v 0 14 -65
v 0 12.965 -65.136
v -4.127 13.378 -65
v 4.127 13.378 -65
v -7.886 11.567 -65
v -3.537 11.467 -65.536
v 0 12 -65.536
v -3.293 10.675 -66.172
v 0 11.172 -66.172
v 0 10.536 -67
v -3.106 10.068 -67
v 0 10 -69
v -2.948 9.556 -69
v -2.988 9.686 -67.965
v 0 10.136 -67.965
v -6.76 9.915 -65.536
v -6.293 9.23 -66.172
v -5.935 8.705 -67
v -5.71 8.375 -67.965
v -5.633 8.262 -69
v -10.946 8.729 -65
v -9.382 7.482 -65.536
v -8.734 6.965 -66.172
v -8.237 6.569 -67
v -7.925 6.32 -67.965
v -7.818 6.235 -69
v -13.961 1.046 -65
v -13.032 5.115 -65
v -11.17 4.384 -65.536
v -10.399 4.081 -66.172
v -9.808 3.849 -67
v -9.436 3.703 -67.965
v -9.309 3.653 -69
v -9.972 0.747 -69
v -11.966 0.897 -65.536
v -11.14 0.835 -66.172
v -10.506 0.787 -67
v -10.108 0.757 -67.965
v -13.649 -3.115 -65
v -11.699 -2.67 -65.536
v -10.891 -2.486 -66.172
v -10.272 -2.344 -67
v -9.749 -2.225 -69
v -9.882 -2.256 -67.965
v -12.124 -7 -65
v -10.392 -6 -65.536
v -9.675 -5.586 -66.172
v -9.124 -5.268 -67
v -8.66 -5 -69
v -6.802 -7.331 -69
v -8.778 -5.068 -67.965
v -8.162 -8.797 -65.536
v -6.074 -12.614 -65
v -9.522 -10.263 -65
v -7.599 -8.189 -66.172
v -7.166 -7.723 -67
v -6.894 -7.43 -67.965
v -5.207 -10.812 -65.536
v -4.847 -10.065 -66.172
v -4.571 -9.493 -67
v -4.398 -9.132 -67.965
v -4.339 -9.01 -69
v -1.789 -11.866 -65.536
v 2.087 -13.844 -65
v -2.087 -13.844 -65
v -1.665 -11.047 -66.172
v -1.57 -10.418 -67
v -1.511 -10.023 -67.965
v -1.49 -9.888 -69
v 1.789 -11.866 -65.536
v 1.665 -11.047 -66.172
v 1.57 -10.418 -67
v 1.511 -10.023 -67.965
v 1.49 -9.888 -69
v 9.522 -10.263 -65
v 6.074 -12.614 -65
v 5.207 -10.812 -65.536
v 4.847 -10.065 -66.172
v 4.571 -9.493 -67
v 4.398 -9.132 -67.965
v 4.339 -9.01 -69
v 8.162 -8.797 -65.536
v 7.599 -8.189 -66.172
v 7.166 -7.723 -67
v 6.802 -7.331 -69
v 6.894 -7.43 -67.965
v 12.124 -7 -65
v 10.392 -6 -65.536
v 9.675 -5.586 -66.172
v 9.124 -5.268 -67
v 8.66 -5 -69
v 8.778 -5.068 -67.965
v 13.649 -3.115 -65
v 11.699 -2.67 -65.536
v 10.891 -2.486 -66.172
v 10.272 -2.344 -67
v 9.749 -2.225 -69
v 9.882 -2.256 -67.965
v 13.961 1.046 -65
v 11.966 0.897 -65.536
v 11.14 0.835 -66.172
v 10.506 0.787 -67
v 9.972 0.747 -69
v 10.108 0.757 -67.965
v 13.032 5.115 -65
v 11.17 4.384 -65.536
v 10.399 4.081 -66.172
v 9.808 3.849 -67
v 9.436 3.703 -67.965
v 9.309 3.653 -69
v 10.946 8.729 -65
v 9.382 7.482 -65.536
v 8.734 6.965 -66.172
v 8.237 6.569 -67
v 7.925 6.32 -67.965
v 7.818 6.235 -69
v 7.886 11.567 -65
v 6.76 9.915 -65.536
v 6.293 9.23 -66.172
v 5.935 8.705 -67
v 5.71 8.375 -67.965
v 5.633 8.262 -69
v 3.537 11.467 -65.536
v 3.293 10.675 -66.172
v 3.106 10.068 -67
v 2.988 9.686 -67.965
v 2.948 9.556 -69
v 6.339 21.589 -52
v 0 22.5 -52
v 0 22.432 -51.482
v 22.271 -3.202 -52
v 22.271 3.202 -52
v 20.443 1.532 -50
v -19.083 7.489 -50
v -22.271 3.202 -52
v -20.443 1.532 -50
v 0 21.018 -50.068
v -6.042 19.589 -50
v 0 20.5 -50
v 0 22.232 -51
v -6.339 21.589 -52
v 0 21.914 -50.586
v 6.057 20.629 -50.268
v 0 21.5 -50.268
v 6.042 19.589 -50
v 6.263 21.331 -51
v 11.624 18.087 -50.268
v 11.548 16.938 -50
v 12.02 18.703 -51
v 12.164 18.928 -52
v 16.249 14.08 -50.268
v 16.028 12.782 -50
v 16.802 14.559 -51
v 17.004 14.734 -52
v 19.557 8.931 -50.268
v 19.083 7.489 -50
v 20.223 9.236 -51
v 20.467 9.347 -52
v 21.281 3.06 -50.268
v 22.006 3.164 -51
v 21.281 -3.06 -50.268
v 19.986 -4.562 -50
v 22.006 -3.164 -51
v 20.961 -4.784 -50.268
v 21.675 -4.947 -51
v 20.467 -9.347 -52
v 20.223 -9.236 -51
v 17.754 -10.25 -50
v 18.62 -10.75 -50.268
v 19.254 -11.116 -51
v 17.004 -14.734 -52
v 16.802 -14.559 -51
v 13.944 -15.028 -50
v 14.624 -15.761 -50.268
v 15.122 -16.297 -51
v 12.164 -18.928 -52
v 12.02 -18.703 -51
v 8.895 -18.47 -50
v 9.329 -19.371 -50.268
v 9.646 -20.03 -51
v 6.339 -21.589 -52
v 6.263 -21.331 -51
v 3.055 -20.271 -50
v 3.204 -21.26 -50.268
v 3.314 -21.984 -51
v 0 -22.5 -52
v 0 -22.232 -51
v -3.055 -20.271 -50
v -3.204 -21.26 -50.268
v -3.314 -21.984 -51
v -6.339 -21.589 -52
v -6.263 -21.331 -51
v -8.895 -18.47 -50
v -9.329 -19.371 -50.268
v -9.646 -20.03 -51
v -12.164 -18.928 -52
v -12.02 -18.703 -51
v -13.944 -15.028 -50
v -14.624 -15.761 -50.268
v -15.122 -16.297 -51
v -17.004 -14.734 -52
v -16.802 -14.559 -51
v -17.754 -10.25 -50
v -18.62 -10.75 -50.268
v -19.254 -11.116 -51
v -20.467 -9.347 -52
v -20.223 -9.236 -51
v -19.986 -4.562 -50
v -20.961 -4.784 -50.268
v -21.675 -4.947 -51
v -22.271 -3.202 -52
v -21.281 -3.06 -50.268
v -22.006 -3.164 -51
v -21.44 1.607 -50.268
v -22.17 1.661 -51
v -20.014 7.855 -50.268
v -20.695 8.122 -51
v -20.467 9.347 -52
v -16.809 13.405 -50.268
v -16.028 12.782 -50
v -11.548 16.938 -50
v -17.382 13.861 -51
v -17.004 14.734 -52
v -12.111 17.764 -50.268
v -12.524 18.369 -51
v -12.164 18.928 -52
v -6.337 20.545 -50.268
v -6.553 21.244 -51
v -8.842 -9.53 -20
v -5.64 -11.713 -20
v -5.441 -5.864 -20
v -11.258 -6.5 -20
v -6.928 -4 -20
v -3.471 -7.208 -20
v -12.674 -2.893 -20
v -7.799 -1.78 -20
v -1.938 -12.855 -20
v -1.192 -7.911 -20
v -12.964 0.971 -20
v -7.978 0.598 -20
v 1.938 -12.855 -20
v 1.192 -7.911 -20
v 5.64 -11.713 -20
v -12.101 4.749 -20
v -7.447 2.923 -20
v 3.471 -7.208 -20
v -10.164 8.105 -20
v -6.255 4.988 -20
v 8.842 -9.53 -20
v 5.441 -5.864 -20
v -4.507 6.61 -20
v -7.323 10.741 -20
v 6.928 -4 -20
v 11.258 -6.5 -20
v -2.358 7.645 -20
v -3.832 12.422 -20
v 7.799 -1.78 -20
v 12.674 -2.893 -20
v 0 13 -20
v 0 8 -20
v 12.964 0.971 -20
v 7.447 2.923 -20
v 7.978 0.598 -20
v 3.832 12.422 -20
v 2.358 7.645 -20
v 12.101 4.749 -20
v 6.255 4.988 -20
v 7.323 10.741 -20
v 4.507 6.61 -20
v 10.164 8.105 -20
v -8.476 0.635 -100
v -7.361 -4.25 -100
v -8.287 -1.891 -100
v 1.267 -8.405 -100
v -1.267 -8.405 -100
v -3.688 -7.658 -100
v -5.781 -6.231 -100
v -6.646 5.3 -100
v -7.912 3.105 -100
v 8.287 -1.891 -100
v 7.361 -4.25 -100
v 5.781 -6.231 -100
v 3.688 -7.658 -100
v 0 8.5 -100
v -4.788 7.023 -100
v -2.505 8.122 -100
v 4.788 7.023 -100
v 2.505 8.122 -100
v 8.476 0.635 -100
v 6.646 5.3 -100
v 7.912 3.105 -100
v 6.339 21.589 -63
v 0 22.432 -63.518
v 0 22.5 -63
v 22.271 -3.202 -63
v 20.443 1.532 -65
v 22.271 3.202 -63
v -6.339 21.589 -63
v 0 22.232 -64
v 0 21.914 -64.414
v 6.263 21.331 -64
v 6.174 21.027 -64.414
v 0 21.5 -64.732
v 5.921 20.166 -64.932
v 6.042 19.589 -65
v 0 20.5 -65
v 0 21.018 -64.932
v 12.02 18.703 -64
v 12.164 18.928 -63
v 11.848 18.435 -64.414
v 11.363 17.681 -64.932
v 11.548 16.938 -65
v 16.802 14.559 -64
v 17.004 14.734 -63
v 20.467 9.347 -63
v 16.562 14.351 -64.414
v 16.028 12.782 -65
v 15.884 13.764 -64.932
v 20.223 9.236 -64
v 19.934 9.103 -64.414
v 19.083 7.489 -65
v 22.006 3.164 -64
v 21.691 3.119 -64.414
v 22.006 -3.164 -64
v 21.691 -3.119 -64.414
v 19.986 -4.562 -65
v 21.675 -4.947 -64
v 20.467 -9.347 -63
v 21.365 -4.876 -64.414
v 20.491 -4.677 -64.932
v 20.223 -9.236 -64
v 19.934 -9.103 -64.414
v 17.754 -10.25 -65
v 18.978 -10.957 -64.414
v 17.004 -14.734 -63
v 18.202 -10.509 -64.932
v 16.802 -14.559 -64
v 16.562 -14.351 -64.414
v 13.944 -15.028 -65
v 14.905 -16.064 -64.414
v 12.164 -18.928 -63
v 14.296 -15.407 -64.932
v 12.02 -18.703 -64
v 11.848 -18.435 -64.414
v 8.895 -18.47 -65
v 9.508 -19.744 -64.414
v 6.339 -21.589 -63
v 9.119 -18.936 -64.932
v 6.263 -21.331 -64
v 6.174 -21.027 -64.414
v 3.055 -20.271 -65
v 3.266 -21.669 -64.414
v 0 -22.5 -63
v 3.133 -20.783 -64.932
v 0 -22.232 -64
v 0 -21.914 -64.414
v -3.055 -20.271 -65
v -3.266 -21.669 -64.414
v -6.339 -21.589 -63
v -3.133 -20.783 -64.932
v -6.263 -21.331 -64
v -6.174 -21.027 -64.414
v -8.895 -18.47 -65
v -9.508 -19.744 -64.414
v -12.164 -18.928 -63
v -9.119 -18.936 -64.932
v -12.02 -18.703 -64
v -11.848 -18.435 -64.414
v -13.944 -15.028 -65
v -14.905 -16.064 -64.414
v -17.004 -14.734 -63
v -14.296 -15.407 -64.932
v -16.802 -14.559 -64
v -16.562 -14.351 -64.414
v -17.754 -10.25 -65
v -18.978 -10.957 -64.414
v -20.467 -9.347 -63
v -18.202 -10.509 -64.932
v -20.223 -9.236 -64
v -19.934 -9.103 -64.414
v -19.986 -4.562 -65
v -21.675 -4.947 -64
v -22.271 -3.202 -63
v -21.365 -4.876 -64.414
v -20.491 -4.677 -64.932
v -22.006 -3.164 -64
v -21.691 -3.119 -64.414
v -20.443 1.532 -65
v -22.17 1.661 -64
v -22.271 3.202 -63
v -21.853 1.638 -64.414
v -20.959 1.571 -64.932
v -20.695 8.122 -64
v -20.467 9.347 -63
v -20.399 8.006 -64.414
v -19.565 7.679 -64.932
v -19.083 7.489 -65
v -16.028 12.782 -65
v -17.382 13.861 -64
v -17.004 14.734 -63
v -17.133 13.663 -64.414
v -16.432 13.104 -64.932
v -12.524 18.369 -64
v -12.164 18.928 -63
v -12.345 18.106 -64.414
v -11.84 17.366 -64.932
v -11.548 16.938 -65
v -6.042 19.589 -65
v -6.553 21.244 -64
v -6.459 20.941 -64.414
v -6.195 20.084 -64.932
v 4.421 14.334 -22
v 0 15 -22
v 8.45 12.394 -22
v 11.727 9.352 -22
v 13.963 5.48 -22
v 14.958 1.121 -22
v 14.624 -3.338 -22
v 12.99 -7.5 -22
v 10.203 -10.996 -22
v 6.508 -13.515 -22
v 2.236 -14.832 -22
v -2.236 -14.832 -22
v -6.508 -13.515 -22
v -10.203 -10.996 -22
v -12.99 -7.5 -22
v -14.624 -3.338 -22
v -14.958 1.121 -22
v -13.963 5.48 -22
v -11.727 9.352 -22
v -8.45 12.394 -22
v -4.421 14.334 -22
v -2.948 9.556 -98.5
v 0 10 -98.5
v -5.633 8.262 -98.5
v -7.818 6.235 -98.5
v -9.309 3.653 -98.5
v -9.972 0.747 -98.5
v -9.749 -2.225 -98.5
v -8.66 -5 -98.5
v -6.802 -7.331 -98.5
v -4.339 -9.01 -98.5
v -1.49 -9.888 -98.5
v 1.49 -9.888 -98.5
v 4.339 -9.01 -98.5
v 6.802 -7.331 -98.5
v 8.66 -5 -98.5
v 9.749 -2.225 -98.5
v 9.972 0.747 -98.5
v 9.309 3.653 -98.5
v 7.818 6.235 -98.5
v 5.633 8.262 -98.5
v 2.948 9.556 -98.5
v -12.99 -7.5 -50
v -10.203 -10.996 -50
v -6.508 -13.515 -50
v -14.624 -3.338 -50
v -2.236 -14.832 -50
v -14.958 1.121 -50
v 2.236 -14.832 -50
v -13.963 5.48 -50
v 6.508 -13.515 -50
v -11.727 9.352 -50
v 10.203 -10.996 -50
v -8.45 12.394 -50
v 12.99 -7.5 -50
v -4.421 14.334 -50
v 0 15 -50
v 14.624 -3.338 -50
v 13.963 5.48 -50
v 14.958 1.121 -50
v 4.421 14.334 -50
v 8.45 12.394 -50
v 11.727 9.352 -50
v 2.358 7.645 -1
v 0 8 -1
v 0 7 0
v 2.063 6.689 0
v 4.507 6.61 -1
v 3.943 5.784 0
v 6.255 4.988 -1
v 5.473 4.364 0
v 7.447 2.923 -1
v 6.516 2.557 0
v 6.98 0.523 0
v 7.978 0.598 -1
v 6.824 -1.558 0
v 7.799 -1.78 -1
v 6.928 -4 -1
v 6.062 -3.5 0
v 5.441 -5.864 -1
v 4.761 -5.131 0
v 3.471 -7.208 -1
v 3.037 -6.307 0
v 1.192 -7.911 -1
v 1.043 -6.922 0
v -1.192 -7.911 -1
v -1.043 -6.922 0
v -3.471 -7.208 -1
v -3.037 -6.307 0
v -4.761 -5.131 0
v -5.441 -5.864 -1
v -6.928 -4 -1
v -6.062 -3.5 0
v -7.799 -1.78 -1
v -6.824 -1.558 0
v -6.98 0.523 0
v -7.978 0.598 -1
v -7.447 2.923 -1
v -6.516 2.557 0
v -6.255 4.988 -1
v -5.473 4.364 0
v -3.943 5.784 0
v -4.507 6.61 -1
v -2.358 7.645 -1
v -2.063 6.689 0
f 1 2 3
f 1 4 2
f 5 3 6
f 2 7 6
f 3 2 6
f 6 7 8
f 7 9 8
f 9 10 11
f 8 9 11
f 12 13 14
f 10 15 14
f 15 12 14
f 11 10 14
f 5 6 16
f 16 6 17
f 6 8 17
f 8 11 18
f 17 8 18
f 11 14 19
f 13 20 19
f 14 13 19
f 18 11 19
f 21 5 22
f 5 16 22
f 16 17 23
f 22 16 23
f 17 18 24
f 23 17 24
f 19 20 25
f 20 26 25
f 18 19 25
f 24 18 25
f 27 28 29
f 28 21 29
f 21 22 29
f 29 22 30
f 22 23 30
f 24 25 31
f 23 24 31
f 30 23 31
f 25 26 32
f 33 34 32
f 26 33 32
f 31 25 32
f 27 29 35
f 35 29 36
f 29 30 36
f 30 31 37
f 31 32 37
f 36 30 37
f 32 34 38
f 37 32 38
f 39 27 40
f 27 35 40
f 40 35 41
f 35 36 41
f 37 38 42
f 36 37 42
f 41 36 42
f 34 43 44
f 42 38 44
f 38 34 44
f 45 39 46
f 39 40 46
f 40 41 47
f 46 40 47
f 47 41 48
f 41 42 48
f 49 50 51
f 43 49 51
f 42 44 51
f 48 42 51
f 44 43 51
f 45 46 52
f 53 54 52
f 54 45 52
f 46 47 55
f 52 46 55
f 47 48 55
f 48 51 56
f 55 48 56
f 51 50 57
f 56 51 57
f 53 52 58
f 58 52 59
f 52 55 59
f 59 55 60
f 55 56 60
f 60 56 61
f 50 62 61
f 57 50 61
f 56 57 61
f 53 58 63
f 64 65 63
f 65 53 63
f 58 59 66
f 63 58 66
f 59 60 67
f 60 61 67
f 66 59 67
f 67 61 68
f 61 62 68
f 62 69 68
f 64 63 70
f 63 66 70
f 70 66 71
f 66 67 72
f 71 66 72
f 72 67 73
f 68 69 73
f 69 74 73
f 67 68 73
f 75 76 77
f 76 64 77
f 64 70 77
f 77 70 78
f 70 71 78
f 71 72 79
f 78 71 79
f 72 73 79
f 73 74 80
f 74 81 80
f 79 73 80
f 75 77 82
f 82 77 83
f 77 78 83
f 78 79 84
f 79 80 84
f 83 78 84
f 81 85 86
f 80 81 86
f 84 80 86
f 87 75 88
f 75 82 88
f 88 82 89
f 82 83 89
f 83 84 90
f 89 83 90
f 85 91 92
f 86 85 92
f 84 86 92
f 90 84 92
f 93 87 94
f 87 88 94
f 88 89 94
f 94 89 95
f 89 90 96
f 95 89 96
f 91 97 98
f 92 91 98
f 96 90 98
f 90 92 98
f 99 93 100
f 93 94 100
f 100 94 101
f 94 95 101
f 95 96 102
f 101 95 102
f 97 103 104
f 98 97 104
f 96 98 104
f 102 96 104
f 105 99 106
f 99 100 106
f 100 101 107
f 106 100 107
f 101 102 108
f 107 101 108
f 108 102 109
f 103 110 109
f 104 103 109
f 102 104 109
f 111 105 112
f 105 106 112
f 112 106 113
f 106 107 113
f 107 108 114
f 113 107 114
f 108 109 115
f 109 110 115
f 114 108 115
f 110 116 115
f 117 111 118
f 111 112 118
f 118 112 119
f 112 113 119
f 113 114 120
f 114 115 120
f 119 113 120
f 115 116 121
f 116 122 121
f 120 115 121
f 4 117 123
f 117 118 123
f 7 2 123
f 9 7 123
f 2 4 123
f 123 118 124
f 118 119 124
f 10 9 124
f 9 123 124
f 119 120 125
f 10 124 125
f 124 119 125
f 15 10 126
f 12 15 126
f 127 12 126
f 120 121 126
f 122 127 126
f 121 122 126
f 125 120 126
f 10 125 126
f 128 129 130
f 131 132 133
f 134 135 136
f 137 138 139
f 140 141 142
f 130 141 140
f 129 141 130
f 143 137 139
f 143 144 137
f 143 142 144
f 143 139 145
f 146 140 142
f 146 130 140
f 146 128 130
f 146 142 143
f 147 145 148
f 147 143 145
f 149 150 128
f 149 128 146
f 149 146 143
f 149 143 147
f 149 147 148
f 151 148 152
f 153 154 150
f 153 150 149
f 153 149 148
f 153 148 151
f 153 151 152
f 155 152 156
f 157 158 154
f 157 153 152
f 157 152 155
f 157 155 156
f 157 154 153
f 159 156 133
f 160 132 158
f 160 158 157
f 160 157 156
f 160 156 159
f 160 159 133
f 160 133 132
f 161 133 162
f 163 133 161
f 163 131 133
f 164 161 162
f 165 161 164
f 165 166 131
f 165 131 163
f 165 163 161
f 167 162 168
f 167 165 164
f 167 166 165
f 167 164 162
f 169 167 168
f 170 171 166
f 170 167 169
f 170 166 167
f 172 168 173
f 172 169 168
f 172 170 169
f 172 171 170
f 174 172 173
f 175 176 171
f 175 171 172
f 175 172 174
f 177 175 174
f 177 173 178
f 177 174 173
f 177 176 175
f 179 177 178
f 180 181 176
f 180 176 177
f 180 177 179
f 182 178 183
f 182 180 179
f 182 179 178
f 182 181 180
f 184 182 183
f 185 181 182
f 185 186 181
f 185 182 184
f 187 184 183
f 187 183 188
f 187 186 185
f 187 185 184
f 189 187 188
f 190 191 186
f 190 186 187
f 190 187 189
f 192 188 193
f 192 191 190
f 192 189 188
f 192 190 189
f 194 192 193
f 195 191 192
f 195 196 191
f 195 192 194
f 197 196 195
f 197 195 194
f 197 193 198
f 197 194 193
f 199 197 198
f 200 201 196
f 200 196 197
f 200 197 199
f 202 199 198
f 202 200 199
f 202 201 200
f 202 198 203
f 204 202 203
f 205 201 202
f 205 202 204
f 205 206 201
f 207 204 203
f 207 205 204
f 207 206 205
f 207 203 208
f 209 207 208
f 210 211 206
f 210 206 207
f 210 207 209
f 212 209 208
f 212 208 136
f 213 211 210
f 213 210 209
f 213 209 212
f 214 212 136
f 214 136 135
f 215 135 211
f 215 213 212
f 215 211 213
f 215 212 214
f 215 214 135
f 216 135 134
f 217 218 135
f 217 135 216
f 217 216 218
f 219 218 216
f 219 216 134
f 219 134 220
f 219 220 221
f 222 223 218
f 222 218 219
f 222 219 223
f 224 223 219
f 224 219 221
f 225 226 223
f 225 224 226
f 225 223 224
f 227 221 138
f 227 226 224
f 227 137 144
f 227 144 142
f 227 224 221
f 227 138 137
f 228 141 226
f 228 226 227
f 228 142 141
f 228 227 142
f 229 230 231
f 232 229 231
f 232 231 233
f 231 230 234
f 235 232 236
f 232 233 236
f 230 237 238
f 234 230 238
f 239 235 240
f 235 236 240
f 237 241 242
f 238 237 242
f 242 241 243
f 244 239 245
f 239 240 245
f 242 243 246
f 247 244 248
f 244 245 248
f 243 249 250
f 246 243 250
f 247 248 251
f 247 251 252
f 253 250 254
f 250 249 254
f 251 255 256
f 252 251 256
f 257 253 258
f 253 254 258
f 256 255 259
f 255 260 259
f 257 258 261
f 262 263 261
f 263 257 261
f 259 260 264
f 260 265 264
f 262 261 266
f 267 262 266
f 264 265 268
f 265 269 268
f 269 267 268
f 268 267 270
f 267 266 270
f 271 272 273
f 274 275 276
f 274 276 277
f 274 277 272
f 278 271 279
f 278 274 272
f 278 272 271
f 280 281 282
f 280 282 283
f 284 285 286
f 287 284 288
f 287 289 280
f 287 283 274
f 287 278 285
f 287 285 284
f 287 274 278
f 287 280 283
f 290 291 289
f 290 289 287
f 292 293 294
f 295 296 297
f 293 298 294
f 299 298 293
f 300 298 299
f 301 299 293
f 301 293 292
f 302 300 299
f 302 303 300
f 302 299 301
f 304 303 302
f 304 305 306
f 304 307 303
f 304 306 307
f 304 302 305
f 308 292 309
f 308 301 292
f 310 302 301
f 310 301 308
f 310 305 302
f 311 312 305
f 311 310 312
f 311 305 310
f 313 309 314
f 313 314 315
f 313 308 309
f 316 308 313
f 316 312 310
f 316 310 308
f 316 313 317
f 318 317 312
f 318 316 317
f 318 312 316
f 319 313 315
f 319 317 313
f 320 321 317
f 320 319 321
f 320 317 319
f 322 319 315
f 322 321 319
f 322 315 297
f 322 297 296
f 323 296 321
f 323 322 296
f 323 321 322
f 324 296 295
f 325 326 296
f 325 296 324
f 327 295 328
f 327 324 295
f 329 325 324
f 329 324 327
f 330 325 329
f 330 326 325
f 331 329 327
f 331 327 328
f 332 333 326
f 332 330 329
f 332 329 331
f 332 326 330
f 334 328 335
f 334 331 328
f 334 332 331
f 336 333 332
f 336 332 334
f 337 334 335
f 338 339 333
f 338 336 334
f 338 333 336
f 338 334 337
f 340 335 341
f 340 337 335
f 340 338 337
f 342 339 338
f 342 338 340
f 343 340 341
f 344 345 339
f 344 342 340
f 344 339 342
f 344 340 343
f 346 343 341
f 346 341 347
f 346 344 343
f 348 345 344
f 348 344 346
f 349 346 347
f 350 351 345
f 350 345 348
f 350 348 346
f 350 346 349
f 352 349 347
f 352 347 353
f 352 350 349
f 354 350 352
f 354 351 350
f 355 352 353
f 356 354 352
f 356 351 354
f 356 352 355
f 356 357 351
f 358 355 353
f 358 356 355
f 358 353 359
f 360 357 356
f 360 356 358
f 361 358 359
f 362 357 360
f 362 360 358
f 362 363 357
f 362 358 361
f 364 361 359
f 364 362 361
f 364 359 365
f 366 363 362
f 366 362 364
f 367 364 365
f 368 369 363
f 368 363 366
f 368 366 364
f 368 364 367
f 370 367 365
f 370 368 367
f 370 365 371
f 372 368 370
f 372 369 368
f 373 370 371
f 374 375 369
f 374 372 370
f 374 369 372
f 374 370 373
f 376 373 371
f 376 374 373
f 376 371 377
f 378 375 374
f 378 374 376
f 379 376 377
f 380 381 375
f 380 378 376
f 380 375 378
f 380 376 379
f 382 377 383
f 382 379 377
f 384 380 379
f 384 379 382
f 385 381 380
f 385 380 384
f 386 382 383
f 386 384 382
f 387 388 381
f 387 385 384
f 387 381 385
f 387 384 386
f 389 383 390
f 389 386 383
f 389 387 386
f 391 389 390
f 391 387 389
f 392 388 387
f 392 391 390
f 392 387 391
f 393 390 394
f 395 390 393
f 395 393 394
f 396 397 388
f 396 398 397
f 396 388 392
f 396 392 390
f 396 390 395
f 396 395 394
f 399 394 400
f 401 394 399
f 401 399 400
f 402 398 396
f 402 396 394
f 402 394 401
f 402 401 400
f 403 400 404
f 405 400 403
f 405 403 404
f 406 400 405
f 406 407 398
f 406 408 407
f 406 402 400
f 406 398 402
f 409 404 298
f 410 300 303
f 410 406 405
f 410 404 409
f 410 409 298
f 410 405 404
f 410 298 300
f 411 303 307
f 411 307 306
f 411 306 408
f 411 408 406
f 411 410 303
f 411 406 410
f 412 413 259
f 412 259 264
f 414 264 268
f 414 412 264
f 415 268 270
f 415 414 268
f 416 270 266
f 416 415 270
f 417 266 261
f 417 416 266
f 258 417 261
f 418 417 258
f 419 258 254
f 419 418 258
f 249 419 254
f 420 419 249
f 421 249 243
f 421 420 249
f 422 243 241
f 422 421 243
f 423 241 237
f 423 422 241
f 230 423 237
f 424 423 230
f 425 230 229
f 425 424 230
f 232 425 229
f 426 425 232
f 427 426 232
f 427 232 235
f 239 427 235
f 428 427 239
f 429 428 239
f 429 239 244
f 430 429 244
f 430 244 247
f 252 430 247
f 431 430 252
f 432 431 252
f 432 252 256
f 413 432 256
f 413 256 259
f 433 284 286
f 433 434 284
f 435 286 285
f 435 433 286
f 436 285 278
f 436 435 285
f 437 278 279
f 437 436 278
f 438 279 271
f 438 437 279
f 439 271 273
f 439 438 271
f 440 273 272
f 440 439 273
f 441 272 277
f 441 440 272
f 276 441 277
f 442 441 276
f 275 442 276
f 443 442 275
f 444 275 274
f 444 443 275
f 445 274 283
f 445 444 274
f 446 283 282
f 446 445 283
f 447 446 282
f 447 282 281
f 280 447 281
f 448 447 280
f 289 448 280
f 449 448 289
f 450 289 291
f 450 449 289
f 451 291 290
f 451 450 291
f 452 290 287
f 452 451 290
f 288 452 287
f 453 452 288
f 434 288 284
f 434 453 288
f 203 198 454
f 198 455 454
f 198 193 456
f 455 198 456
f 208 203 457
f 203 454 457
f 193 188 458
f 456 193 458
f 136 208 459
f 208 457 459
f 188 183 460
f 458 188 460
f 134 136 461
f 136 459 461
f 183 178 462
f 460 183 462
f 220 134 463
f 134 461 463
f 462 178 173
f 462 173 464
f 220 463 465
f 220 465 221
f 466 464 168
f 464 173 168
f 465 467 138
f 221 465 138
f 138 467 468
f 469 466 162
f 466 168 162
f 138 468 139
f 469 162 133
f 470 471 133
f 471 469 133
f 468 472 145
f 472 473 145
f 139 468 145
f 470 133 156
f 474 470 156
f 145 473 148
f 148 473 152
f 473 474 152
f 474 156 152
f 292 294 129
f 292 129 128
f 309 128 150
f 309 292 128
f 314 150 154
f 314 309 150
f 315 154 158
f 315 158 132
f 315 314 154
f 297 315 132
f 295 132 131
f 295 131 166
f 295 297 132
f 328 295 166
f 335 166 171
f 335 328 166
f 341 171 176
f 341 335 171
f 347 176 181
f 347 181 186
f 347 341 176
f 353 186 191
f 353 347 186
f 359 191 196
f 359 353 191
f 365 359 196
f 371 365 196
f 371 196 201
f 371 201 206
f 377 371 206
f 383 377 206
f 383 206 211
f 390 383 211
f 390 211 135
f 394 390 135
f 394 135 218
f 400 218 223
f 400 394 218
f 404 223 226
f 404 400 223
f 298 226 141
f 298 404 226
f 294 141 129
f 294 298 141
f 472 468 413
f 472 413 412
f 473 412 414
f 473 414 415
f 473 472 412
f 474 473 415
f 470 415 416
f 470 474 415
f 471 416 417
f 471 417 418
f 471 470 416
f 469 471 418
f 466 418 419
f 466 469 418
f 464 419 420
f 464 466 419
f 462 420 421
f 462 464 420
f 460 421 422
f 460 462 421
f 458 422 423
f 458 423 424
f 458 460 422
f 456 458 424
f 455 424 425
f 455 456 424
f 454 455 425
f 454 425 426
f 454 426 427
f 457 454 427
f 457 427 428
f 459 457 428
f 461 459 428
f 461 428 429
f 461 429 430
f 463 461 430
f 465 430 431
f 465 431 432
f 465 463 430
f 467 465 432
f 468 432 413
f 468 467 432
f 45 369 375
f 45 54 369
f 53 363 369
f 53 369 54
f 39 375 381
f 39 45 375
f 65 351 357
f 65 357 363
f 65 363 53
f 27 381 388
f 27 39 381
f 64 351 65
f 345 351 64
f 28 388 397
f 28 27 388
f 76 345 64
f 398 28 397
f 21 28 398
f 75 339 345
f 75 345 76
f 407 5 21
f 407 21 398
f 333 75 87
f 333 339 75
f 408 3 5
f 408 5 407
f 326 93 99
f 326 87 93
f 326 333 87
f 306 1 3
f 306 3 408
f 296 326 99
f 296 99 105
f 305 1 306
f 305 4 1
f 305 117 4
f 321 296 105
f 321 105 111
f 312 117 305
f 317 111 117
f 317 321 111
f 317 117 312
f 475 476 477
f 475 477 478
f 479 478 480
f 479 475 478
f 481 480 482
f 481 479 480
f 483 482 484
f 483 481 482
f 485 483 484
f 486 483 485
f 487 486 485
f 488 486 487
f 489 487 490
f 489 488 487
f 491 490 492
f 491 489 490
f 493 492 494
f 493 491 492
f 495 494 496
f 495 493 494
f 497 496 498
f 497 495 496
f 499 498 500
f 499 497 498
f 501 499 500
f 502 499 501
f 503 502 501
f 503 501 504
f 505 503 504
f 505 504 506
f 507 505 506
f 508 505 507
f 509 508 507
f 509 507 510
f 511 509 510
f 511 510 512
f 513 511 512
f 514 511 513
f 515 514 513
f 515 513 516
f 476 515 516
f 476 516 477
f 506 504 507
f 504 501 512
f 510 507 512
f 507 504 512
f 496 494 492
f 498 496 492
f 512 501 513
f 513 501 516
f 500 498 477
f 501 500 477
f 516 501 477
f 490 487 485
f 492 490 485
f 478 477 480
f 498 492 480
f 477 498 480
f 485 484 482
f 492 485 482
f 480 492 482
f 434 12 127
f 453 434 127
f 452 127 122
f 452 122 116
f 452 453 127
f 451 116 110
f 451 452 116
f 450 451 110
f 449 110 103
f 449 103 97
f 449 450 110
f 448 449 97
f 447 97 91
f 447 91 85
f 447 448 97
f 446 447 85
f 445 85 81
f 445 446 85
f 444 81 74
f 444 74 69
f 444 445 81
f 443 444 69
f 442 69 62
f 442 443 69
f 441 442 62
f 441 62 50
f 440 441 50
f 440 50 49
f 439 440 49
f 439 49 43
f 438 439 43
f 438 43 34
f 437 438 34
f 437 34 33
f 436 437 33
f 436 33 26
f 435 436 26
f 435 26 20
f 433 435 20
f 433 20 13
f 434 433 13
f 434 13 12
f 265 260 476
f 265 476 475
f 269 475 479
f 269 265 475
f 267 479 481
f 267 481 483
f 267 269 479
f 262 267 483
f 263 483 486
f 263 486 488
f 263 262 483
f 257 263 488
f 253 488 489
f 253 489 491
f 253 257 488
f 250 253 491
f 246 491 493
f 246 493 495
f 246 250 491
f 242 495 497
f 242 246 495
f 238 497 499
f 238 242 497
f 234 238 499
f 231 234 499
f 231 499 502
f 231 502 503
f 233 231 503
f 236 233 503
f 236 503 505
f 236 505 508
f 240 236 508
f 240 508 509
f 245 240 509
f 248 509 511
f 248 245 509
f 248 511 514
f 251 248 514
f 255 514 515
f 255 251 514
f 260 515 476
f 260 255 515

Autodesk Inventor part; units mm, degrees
ref_plane "YZ Plane" through (0, 0, 0) normal (1, 0, 0) x (0, 1, 0)
ref_plane "XZ Plane" through (0, 0, 0) normal (0, 1, 0) x (-1, 0, 0)
ref_plane "XY Plane" through (0, 0, 0) normal (0, 0, 1) x (1, 0, 0)
sketch "Sketch1" plane through (0, 0, 0) normal (1, 0, 0) x (0, 1, 0)
  line L0 (0, 0) -> (0, -100)
  line L1 (0, 0) -> (8, 0)
  line L2 (8, 0) -> (8, -20)
  line L3 (8, -20) -> (15, -20)
  line L4 (15, -20) -> (15, -50)
  line L5 (15, -50) -> (22.5, -50)
  line L6 (22.5, -50) -> (22.5, -65)
  line L7 (22.5, -65) -> (10, -65)
  line L8 (10, -65) -> (10, -100)
  line L9 (10, -100) -> (0, -100)
  dimension "d0" = 100
  dimension "d1" = 8
  dimension "d2" = 20
  dimension "d3" = 7
  dimension "d4" = 30
  dimension "d5" = 7.5
  dimension "d6" = 15
  dimension "d7" = 12.5
revolve "Revolution1" add sketch "Sketch1" angle 360 about axis through (0, 0, 0) along (0, 0, -1)
chamfer "Chamfer1" distance 2 angle 45 1 edges at (0, -15, -20)
chamfer "Chamfer2" distance 1 angle 45 1 edges at (0, -8, 0)
fillet "Fillet1" radius 2 1 edges at (0, -22.5, -50)
fillet "Fillet2" radius 2 1 edges at (0, -22.5, -65)
fillet "Fillet3" radius 4 1 edges at (0, -10, -65)
chamfer "Chamfer3" distance 1.5 angle 45 1 edges at (0, -10, -100)
